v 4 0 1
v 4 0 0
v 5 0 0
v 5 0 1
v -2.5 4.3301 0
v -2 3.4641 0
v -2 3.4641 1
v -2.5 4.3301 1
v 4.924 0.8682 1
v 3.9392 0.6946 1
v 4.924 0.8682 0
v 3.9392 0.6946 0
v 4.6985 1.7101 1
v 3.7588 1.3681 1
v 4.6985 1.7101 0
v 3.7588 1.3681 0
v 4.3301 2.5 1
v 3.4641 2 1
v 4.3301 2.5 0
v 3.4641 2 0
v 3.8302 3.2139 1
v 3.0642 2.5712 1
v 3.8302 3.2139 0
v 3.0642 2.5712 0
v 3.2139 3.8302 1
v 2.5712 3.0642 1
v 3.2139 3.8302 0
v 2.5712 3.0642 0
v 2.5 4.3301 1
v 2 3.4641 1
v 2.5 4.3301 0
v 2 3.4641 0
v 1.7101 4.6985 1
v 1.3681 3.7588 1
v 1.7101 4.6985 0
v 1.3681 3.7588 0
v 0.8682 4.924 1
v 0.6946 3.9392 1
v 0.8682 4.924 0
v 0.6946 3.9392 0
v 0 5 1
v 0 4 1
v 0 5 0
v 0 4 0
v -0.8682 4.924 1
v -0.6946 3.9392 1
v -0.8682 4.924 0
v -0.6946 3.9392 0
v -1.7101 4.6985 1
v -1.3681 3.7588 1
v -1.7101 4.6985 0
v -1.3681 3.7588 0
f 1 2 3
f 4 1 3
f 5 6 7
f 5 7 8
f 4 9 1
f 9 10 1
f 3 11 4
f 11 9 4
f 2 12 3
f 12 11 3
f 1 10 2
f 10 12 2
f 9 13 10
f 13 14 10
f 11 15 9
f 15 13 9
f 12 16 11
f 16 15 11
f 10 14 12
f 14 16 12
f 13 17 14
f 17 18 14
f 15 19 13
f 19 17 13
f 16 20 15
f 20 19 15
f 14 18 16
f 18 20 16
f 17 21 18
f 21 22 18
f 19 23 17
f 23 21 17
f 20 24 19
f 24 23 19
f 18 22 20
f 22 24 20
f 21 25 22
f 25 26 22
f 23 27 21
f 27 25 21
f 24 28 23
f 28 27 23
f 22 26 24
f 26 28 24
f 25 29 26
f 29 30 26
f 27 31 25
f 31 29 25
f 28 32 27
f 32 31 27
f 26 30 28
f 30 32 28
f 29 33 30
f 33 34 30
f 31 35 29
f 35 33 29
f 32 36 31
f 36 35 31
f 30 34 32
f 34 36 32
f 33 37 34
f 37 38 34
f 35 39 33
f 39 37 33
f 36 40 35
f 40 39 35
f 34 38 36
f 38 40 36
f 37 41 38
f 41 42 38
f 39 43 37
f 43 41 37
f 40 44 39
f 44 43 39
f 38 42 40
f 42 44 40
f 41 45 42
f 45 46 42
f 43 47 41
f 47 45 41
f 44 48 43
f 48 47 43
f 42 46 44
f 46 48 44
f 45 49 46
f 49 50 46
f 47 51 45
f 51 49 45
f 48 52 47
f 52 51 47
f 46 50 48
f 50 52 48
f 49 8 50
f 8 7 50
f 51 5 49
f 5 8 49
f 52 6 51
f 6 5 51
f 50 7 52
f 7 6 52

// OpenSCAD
// partial revolution with a start angle
rotate_extrude(angle = 120, start = 45, $fn = 36) translate([4, 0]) square(1);
